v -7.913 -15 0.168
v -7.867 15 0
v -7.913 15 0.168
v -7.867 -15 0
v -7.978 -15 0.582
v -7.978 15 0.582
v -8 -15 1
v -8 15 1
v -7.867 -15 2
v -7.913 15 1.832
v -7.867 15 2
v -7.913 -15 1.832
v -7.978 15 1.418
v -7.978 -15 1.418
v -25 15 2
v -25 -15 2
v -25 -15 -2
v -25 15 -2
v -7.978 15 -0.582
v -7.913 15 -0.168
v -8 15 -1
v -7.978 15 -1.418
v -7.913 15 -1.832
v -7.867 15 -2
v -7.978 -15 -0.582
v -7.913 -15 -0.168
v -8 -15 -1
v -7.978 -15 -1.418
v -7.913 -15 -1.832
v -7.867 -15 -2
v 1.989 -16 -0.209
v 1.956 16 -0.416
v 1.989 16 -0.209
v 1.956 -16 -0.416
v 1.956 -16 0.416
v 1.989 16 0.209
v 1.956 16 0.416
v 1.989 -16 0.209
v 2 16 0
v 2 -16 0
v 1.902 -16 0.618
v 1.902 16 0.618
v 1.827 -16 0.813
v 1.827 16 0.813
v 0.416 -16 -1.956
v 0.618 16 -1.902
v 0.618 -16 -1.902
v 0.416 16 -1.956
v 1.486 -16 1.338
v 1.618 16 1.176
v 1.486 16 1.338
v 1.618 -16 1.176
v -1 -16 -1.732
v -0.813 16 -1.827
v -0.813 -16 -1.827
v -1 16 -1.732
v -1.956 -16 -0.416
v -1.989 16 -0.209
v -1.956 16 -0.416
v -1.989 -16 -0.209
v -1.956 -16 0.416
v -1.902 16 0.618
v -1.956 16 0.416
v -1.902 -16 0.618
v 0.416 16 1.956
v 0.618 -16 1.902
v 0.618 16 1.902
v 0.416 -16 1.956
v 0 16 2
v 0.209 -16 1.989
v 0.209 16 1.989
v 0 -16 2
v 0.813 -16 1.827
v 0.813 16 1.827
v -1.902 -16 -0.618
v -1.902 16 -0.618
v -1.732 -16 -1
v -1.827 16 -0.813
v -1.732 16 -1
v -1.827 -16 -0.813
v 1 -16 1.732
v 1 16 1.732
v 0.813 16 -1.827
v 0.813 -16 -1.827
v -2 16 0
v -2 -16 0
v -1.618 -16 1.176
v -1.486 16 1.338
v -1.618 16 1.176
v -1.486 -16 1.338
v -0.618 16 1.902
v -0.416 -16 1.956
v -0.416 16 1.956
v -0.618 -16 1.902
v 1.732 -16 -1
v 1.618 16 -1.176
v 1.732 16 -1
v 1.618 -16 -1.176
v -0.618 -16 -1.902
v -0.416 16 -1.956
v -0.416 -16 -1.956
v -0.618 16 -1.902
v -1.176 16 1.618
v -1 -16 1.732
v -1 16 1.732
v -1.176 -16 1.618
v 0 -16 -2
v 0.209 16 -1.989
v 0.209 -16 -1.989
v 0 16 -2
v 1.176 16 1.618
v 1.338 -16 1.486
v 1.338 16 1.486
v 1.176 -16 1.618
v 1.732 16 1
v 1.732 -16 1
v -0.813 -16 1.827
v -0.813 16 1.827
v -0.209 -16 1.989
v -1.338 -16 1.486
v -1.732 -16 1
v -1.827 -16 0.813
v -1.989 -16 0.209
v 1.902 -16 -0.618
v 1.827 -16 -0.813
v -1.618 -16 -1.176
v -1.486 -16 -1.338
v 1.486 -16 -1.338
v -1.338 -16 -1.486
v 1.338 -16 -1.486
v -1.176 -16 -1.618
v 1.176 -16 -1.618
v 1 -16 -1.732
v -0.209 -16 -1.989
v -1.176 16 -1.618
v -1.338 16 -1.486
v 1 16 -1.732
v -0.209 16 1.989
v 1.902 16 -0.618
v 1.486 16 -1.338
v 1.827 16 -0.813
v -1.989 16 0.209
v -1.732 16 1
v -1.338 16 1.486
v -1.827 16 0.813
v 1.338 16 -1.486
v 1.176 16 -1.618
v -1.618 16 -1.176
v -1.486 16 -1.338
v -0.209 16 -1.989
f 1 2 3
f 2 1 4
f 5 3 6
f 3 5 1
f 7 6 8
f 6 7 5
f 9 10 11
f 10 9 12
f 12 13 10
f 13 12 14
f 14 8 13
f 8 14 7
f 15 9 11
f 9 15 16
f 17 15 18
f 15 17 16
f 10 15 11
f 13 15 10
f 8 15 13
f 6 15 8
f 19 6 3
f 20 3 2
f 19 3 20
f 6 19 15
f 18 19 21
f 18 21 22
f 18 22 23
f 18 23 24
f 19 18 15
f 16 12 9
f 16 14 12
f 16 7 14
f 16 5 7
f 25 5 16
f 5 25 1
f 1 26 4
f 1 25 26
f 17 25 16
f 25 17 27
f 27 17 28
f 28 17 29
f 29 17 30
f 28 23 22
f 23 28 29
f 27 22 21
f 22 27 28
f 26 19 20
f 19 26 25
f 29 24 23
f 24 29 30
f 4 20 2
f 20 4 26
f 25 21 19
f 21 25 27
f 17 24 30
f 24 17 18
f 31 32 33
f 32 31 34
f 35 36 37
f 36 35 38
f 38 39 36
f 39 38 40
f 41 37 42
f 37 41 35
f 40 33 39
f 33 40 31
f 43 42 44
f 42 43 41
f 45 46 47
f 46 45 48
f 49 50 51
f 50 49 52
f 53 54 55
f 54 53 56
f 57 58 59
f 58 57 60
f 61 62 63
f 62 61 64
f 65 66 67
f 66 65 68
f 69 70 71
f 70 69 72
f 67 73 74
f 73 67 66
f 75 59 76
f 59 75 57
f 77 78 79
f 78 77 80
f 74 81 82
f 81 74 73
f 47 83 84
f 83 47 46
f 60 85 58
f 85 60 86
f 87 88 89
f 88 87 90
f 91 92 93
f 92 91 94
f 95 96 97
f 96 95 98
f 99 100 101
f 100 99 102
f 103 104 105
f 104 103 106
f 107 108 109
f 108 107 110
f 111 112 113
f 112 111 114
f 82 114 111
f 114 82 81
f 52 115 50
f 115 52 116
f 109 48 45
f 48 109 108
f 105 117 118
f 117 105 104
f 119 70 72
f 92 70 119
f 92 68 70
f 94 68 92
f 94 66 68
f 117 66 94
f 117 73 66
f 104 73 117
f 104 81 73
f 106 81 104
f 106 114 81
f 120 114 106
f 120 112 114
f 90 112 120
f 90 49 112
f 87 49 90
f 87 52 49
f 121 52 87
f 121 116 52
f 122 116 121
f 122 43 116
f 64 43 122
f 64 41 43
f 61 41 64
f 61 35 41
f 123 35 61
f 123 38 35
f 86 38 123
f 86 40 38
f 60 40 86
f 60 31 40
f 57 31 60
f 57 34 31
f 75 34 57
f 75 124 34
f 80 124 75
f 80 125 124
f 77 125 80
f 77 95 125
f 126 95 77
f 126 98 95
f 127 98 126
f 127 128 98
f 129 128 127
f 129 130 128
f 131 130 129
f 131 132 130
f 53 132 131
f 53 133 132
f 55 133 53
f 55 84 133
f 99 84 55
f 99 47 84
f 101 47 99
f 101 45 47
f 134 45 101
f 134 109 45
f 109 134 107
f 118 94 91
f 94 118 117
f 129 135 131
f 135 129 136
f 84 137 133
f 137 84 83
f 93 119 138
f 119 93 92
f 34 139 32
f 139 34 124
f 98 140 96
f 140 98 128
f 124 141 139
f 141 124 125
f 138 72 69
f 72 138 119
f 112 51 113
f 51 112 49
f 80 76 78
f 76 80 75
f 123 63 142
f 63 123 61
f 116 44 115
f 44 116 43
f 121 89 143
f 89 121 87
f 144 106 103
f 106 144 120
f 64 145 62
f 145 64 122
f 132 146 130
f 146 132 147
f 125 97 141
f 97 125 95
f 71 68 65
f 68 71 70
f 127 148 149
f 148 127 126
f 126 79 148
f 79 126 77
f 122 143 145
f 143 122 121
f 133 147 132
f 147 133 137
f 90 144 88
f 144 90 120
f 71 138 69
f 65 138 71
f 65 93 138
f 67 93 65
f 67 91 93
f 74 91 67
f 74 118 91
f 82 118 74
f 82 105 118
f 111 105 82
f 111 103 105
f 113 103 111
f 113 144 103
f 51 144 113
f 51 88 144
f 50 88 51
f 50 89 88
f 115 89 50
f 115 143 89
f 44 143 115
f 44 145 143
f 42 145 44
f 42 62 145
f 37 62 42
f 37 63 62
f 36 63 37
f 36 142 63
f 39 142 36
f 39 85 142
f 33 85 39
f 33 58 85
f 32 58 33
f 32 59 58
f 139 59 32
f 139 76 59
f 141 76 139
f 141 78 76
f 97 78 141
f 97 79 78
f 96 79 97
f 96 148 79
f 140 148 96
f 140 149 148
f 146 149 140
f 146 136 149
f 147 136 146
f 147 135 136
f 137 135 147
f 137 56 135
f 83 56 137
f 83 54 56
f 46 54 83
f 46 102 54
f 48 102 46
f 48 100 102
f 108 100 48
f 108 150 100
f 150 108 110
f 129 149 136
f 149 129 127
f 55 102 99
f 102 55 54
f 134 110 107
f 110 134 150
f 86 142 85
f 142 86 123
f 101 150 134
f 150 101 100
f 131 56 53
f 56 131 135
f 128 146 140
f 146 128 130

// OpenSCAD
// OpenSCAD: 2 leaves + pin axis butt hinge (180° open state)

// Dimensions (mm)
leaf_w  = 25;
leaf_h  = 30;
leaf_t  = 2;

knuckle_d = 8;     // outer knuckle diameter
knuckle_r = knuckle_d/2;
pin_d     = 4;     // pin diameter
pin_r     = pin_d/2;
hole_d    = 4.6;   // inner hole diameter for knuckle/pin clearance (approx)
hole_r    = hole_d/2;

// Arrays defining knuckle positions along Y (as described)
left_knuckles_y  = [-12, 0, 12];   // 3 knuckles on left leaf (X ~ -4)
right_knuckles_y = [-6, 6];       // 2 knuckles on right leaf (X ~ +4)

left_holes_y  = [-12, 0, 12];      // interleaved knuckle holes on left (Y positions)
right_holes_y = [-6, 6];            // interleaved knuckle holes on right (Y positions)

// Base left leaf (X negative side)
module left_leaf() {
    difference() {
        // Base plate for left leaf: X from -25 to 0, Y from -15 to 15, Z from 0 to 2
        translate([-25, -15, 0])
            cube([25, 30, 2], center = false);

        // Left knuckles: cylindrical bosses (outer diameter 8 mm) along Y
        for (y = left_knuckles_y) {
            translate([-4, y, 1])
                rotate([90, 0, 0])
                    cylinder(h = 30, r = knuckle_r, center = true);
        }

        // Holes for pin along Y (inner diameter 4.6 mm)
        for (y = left_holes_y) {
            translate([0, y, 0])
                rotate([90, 0, 0])
                    cylinder(h = 30, r = hole_r, center = true);
        }

        // M3 mounting holes (approximate via simple through-hole cylinders)
        // 3 holes with 8 mm pitch along Y; using through holes (simplified)
        for (y = [-12, -4, 4]) {
            translate([0, y, 0])
                rotate([90, 0, 0])
                    cylinder(h = 30, r = 1.6, center = true);
        }
    }
}

// Base right leaf (X positive side)
module right_leaf() {
    difference() {
        // Base plate for right leaf: X from 0 to 25, Y -15 to 15, Z 0 to 2
        translate([0, -15, 0])
            cube([25, 30, 2], center = false);

        // Right knuckles: cylindrical bosses along Y
        for (y = right_knuckles_y) {
            translate([4, y, 1])
                rotate([90, 0, 0])
                    cylinder(h = 30, r = knuckle_r, center = true);
        }

        // Holes for pin along Y (inner diameter 4.6 mm)
        for (y = right_holes_y) {
            translate([0, y, 0])
                rotate([90, 0, 0])
                    cylinder(h = 30, r = hole_r, center = true);
        }

        // M3 mounting holes (simplified)
        for (y = [-6, 0, 6]) {
            translate([0, y, 0])
                rotate([90, 0, 0])
                    cylinder(h = 30, r = 1.6, center = true);
        }
    }
}

// Pin axis (along Y, centered at origin, length 32 mm to protrude 1 mm past each leaf)
module pin_axis() {
    // Cylinder along Y by rotating a Z-axis cylinder
    rotate([0, 0, 0])
        rotate([90, 0, 0])
            cylinder(h = 32, r = pin_r, center = true);
}

// Assemble hinge in 180° open state:
// - left leaf at X < 0
// - right leaf rotated 180° around hinge axis (Y) to lie in the same plane as left leaf (open state)
module hinge_open_state() {
    union() {
        left_leaf();
        // Opened state: rotate the right leaf around hinge axis (Y) by 180°
        rotate([0, 180, 0])
            right_leaf();
        // Pin passes through both leaves
        pin_axis();
    }
}

// Increase resolution for circles/arcs if desired
$fn = 60;

// Output final model
hinge_open_state();
